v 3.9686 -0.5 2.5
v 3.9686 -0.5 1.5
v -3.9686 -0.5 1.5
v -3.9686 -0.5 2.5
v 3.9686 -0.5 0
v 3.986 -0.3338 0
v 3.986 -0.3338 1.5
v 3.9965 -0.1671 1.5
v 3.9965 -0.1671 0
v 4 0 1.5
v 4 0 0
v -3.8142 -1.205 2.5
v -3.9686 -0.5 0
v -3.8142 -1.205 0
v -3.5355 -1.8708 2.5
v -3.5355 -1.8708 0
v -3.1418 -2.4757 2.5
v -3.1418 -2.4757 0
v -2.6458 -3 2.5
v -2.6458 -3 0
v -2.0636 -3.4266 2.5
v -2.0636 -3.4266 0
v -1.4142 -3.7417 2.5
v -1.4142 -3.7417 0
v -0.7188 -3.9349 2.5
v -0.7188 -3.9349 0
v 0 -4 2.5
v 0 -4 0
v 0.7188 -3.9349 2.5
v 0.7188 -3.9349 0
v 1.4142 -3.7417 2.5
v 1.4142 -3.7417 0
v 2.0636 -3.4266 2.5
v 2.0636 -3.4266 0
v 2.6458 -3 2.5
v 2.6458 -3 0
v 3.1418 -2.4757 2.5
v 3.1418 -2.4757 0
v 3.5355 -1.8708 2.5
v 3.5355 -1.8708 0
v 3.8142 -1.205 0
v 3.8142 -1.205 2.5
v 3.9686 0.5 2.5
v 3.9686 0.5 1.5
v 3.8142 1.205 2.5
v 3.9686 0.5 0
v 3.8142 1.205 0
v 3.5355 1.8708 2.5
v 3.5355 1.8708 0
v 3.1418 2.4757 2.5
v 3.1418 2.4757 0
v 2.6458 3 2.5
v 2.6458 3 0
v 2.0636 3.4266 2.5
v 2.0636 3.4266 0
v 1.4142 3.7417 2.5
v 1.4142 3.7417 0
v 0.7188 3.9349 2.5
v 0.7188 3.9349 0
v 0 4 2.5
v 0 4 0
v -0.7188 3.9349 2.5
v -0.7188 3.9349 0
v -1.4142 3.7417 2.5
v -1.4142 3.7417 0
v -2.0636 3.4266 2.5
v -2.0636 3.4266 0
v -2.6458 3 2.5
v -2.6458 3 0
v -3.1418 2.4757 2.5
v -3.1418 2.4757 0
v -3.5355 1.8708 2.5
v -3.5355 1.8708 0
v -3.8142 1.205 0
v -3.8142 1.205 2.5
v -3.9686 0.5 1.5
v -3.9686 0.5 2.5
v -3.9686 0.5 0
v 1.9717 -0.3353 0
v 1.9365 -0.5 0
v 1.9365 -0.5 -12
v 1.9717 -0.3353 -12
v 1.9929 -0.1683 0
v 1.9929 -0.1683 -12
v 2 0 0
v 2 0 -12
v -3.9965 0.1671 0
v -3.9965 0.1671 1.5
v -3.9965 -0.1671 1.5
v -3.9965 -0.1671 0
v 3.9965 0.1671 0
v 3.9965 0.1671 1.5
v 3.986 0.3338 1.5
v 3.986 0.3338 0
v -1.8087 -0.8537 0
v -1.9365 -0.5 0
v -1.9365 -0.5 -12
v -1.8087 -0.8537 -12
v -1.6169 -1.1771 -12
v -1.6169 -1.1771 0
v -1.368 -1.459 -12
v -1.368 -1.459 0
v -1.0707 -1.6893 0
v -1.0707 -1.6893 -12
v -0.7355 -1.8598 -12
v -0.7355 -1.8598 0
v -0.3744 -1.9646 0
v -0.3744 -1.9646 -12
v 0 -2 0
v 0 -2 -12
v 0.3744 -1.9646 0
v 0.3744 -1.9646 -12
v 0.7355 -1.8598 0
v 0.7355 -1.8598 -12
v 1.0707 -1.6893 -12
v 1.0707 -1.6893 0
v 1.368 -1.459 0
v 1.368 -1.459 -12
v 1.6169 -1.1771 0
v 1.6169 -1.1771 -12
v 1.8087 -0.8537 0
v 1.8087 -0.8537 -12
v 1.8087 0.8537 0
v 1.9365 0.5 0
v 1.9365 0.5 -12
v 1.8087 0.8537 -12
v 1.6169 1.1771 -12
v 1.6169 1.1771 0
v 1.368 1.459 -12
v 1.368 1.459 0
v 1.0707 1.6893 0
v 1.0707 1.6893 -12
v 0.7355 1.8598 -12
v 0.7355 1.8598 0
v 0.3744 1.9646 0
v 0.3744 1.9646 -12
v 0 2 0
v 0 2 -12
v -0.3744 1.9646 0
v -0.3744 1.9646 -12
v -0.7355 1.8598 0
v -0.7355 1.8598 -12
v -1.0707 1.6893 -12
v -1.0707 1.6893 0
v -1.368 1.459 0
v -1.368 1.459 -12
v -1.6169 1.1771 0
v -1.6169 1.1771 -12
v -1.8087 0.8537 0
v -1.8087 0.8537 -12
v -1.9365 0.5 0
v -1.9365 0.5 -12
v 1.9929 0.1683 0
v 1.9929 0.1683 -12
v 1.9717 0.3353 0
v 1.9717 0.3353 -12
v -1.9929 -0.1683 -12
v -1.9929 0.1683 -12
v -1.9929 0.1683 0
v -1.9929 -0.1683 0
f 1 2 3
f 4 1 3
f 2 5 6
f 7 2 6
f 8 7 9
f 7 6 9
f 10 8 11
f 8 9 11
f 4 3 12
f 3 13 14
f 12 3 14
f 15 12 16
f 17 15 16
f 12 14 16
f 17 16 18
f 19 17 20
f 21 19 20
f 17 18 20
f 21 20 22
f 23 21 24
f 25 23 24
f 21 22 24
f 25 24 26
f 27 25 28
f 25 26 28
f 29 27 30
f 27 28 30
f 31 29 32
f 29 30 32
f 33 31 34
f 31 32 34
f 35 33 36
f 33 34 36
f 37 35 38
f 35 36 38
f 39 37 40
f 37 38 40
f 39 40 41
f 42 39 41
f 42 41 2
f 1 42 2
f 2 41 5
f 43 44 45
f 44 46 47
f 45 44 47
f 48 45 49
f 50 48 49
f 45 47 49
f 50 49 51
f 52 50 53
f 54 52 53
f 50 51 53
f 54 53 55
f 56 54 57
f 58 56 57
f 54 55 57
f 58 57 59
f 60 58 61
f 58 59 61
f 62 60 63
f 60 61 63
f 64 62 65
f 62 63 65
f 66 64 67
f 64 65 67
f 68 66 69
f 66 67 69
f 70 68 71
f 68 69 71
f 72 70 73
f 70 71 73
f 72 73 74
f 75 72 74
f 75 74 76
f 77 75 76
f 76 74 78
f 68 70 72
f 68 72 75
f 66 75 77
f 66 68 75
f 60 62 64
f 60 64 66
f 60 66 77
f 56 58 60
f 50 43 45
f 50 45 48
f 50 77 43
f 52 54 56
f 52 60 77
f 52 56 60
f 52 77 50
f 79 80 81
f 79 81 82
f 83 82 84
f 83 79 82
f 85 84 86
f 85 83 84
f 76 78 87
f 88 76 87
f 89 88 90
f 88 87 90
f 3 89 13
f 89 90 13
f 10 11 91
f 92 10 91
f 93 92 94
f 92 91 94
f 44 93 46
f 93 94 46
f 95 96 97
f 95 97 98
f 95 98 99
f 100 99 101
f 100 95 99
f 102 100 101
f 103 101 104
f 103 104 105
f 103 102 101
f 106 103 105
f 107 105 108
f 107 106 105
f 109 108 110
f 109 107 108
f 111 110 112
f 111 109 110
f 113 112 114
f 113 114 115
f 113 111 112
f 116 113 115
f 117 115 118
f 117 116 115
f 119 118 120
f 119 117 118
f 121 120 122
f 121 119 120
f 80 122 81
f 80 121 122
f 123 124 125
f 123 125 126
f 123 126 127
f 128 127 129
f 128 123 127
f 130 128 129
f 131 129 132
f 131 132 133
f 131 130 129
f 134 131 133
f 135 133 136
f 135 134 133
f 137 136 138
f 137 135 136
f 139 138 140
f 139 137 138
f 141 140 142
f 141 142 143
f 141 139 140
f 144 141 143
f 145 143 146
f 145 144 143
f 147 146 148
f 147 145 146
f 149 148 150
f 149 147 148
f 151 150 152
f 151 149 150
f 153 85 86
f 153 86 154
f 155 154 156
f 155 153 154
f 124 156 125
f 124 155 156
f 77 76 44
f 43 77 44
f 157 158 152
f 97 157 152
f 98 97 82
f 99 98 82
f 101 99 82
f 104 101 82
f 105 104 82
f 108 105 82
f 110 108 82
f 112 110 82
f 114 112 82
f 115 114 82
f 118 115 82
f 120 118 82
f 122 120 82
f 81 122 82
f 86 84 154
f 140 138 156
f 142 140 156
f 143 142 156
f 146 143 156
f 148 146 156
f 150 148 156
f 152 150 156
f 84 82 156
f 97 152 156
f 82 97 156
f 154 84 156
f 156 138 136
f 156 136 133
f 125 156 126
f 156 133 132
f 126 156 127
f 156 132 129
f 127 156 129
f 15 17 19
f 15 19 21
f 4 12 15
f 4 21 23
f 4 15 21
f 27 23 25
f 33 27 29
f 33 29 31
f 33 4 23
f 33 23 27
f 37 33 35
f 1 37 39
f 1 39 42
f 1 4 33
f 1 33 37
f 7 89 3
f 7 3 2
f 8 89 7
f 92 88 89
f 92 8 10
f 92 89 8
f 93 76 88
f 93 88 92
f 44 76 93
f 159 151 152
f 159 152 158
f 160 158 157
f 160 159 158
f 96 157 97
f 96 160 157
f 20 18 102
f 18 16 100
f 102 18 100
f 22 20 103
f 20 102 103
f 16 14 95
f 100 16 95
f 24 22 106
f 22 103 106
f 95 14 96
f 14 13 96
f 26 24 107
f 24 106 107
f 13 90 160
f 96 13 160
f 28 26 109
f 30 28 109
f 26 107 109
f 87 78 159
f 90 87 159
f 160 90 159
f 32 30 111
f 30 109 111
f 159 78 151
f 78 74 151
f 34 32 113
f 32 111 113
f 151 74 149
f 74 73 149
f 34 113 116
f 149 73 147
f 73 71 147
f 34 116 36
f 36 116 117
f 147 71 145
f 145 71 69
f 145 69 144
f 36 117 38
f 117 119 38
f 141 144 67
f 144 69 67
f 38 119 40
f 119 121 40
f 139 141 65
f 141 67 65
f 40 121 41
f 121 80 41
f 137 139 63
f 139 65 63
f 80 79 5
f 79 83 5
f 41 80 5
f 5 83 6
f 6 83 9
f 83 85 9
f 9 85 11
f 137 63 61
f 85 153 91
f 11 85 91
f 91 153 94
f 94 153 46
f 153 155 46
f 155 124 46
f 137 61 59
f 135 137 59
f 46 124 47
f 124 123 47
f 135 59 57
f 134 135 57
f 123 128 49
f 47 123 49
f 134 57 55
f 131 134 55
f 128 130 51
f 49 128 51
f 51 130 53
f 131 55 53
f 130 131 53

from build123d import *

# Parameters (mm, degrees)
F1_DEPTH = 12
F2_DEPTH = 2.5
F3_DEPTH = 1.5


# Not quite as in the source:
# - a feature names something its author has since deleted; it is built from what else it names


with BuildPart() as f1:
    # F0 (on Top) → F1 (new body)
    with BuildSketch(Plane.XY):
        with BuildLine():
            Line((-1.9364916731, 0.5), (1.9364916731, 0.5))
            ThreePointArc((1.9364916731, 0.5), (0, 2), (-1.9364916731, 0.5))
        make_face()
        with BuildLine():
            ThreePointArc((2, 0), (1.9840593925, 0.252008585), (1.9364916731, 0.5))
            Line((1.9364916731, 0.5), (-1.9364916731, 0.5))
            ThreePointArc((-1.9364916731, 0.5), (-2, 0), (-1.9364916731, -0.5))
            Line((-1.9364916731, -0.5), (1.9364916731, -0.5))
            ThreePointArc((1.9364916731, -0.5), (1.9840593925, -0.252008585), (2, 0))
        make_face()
        with BuildLine():
            ThreePointArc((-1.9364916731, -0.5), (0, -2), (1.9364916731, -0.5))
            Line((1.9364916731, -0.5), (-1.9364916731, -0.5))
        make_face()
    extrude(amount=-F1_DEPTH)

    # F0 (on Top) → F2 (join)
    with BuildSketch(Plane.XY):
        with BuildLine():
            ThreePointArc((-3.9686269666, -0.5), (0, -4), (3.9686269666, -0.5))
            Line((3.9686269666, -0.5), (1.9364916731, -0.5))
            ThreePointArc((1.9364916731, -0.5), (0, -2), (-1.9364916731, -0.5))
            Line((-1.9364916731, -0.5), (-3.9686269666, -0.5))
        make_face()
        with BuildLine():
            Line((1.9364916731, 0.5), (3.9686269666, 0.5))
            ThreePointArc((3.9686269666, 0.5), (0, 4), (-3.9686269666, 0.5))
            Line((-3.9686269666, 0.5), (-1.9364916731, 0.5))
            ThreePointArc((-1.9364916731, 0.5), (0, 2), (1.9364916731, 0.5))
        make_face()
        with BuildLine():
            Line((-1.9364916731, 0.5), (1.9364916731, 0.5))
            ThreePointArc((1.9364916731, 0.5), (0, 2), (-1.9364916731, 0.5))
        make_face()
        with BuildLine():
            ThreePointArc((-1.9364916731, -0.5), (0, -2), (1.9364916731, -0.5))
            Line((1.9364916731, -0.5), (-1.9364916731, -0.5))
        make_face()
    extrude(amount=F2_DEPTH)

    # F0 (on Top) → F3 (join)
    with BuildSketch(Plane.XY):
        with BuildLine():
            Line((-1.9364916731, 0.5), (-3.9686269666, 0.5))
            ThreePointArc((-3.9686269666, 0.5), (-4, 0), (-3.9686269666, -0.5))
            Line((-3.9686269666, -0.5), (-1.9364916731, -0.5))
            ThreePointArc((-1.9364916731, -0.5), (-2, 0), (-1.9364916731, 0.5))
        make_face()
        with BuildLine():
            ThreePointArc((2, 0), (1.9840593925, 0.252008585), (1.9364916731, 0.5))
            Line((1.9364916731, 0.5), (-1.9364916731, 0.5))
            ThreePointArc((-1.9364916731, 0.5), (-2, 0), (-1.9364916731, -0.5))
            Line((-1.9364916731, -0.5), (1.9364916731, -0.5))
            ThreePointArc((1.9364916731, -0.5), (1.9840593925, -0.252008585), (2, 0))
        make_face()
        with BuildLine():
            ThreePointArc((3.9686269666, -0.5), (3.9921490369, -0.2504916502), (4, 0))
            ThreePointArc((4, 0), (3.9921490369, 0.2504916502), (3.9686269666, 0.5))
            Line((3.9686269666, 0.5), (1.9364916731, 0.5))
            ThreePointArc((1.9364916731, 0.5), (1.9840593925, 0.252008585), (2, 0))
            ThreePointArc((2, 0), (1.9840593925, -0.252008585), (1.9364916731, -0.5))
            Line((1.9364916731, -0.5), (3.9686269666, -0.5))
        make_face()
    extrude(amount=F3_DEPTH)


solid = f1.part
